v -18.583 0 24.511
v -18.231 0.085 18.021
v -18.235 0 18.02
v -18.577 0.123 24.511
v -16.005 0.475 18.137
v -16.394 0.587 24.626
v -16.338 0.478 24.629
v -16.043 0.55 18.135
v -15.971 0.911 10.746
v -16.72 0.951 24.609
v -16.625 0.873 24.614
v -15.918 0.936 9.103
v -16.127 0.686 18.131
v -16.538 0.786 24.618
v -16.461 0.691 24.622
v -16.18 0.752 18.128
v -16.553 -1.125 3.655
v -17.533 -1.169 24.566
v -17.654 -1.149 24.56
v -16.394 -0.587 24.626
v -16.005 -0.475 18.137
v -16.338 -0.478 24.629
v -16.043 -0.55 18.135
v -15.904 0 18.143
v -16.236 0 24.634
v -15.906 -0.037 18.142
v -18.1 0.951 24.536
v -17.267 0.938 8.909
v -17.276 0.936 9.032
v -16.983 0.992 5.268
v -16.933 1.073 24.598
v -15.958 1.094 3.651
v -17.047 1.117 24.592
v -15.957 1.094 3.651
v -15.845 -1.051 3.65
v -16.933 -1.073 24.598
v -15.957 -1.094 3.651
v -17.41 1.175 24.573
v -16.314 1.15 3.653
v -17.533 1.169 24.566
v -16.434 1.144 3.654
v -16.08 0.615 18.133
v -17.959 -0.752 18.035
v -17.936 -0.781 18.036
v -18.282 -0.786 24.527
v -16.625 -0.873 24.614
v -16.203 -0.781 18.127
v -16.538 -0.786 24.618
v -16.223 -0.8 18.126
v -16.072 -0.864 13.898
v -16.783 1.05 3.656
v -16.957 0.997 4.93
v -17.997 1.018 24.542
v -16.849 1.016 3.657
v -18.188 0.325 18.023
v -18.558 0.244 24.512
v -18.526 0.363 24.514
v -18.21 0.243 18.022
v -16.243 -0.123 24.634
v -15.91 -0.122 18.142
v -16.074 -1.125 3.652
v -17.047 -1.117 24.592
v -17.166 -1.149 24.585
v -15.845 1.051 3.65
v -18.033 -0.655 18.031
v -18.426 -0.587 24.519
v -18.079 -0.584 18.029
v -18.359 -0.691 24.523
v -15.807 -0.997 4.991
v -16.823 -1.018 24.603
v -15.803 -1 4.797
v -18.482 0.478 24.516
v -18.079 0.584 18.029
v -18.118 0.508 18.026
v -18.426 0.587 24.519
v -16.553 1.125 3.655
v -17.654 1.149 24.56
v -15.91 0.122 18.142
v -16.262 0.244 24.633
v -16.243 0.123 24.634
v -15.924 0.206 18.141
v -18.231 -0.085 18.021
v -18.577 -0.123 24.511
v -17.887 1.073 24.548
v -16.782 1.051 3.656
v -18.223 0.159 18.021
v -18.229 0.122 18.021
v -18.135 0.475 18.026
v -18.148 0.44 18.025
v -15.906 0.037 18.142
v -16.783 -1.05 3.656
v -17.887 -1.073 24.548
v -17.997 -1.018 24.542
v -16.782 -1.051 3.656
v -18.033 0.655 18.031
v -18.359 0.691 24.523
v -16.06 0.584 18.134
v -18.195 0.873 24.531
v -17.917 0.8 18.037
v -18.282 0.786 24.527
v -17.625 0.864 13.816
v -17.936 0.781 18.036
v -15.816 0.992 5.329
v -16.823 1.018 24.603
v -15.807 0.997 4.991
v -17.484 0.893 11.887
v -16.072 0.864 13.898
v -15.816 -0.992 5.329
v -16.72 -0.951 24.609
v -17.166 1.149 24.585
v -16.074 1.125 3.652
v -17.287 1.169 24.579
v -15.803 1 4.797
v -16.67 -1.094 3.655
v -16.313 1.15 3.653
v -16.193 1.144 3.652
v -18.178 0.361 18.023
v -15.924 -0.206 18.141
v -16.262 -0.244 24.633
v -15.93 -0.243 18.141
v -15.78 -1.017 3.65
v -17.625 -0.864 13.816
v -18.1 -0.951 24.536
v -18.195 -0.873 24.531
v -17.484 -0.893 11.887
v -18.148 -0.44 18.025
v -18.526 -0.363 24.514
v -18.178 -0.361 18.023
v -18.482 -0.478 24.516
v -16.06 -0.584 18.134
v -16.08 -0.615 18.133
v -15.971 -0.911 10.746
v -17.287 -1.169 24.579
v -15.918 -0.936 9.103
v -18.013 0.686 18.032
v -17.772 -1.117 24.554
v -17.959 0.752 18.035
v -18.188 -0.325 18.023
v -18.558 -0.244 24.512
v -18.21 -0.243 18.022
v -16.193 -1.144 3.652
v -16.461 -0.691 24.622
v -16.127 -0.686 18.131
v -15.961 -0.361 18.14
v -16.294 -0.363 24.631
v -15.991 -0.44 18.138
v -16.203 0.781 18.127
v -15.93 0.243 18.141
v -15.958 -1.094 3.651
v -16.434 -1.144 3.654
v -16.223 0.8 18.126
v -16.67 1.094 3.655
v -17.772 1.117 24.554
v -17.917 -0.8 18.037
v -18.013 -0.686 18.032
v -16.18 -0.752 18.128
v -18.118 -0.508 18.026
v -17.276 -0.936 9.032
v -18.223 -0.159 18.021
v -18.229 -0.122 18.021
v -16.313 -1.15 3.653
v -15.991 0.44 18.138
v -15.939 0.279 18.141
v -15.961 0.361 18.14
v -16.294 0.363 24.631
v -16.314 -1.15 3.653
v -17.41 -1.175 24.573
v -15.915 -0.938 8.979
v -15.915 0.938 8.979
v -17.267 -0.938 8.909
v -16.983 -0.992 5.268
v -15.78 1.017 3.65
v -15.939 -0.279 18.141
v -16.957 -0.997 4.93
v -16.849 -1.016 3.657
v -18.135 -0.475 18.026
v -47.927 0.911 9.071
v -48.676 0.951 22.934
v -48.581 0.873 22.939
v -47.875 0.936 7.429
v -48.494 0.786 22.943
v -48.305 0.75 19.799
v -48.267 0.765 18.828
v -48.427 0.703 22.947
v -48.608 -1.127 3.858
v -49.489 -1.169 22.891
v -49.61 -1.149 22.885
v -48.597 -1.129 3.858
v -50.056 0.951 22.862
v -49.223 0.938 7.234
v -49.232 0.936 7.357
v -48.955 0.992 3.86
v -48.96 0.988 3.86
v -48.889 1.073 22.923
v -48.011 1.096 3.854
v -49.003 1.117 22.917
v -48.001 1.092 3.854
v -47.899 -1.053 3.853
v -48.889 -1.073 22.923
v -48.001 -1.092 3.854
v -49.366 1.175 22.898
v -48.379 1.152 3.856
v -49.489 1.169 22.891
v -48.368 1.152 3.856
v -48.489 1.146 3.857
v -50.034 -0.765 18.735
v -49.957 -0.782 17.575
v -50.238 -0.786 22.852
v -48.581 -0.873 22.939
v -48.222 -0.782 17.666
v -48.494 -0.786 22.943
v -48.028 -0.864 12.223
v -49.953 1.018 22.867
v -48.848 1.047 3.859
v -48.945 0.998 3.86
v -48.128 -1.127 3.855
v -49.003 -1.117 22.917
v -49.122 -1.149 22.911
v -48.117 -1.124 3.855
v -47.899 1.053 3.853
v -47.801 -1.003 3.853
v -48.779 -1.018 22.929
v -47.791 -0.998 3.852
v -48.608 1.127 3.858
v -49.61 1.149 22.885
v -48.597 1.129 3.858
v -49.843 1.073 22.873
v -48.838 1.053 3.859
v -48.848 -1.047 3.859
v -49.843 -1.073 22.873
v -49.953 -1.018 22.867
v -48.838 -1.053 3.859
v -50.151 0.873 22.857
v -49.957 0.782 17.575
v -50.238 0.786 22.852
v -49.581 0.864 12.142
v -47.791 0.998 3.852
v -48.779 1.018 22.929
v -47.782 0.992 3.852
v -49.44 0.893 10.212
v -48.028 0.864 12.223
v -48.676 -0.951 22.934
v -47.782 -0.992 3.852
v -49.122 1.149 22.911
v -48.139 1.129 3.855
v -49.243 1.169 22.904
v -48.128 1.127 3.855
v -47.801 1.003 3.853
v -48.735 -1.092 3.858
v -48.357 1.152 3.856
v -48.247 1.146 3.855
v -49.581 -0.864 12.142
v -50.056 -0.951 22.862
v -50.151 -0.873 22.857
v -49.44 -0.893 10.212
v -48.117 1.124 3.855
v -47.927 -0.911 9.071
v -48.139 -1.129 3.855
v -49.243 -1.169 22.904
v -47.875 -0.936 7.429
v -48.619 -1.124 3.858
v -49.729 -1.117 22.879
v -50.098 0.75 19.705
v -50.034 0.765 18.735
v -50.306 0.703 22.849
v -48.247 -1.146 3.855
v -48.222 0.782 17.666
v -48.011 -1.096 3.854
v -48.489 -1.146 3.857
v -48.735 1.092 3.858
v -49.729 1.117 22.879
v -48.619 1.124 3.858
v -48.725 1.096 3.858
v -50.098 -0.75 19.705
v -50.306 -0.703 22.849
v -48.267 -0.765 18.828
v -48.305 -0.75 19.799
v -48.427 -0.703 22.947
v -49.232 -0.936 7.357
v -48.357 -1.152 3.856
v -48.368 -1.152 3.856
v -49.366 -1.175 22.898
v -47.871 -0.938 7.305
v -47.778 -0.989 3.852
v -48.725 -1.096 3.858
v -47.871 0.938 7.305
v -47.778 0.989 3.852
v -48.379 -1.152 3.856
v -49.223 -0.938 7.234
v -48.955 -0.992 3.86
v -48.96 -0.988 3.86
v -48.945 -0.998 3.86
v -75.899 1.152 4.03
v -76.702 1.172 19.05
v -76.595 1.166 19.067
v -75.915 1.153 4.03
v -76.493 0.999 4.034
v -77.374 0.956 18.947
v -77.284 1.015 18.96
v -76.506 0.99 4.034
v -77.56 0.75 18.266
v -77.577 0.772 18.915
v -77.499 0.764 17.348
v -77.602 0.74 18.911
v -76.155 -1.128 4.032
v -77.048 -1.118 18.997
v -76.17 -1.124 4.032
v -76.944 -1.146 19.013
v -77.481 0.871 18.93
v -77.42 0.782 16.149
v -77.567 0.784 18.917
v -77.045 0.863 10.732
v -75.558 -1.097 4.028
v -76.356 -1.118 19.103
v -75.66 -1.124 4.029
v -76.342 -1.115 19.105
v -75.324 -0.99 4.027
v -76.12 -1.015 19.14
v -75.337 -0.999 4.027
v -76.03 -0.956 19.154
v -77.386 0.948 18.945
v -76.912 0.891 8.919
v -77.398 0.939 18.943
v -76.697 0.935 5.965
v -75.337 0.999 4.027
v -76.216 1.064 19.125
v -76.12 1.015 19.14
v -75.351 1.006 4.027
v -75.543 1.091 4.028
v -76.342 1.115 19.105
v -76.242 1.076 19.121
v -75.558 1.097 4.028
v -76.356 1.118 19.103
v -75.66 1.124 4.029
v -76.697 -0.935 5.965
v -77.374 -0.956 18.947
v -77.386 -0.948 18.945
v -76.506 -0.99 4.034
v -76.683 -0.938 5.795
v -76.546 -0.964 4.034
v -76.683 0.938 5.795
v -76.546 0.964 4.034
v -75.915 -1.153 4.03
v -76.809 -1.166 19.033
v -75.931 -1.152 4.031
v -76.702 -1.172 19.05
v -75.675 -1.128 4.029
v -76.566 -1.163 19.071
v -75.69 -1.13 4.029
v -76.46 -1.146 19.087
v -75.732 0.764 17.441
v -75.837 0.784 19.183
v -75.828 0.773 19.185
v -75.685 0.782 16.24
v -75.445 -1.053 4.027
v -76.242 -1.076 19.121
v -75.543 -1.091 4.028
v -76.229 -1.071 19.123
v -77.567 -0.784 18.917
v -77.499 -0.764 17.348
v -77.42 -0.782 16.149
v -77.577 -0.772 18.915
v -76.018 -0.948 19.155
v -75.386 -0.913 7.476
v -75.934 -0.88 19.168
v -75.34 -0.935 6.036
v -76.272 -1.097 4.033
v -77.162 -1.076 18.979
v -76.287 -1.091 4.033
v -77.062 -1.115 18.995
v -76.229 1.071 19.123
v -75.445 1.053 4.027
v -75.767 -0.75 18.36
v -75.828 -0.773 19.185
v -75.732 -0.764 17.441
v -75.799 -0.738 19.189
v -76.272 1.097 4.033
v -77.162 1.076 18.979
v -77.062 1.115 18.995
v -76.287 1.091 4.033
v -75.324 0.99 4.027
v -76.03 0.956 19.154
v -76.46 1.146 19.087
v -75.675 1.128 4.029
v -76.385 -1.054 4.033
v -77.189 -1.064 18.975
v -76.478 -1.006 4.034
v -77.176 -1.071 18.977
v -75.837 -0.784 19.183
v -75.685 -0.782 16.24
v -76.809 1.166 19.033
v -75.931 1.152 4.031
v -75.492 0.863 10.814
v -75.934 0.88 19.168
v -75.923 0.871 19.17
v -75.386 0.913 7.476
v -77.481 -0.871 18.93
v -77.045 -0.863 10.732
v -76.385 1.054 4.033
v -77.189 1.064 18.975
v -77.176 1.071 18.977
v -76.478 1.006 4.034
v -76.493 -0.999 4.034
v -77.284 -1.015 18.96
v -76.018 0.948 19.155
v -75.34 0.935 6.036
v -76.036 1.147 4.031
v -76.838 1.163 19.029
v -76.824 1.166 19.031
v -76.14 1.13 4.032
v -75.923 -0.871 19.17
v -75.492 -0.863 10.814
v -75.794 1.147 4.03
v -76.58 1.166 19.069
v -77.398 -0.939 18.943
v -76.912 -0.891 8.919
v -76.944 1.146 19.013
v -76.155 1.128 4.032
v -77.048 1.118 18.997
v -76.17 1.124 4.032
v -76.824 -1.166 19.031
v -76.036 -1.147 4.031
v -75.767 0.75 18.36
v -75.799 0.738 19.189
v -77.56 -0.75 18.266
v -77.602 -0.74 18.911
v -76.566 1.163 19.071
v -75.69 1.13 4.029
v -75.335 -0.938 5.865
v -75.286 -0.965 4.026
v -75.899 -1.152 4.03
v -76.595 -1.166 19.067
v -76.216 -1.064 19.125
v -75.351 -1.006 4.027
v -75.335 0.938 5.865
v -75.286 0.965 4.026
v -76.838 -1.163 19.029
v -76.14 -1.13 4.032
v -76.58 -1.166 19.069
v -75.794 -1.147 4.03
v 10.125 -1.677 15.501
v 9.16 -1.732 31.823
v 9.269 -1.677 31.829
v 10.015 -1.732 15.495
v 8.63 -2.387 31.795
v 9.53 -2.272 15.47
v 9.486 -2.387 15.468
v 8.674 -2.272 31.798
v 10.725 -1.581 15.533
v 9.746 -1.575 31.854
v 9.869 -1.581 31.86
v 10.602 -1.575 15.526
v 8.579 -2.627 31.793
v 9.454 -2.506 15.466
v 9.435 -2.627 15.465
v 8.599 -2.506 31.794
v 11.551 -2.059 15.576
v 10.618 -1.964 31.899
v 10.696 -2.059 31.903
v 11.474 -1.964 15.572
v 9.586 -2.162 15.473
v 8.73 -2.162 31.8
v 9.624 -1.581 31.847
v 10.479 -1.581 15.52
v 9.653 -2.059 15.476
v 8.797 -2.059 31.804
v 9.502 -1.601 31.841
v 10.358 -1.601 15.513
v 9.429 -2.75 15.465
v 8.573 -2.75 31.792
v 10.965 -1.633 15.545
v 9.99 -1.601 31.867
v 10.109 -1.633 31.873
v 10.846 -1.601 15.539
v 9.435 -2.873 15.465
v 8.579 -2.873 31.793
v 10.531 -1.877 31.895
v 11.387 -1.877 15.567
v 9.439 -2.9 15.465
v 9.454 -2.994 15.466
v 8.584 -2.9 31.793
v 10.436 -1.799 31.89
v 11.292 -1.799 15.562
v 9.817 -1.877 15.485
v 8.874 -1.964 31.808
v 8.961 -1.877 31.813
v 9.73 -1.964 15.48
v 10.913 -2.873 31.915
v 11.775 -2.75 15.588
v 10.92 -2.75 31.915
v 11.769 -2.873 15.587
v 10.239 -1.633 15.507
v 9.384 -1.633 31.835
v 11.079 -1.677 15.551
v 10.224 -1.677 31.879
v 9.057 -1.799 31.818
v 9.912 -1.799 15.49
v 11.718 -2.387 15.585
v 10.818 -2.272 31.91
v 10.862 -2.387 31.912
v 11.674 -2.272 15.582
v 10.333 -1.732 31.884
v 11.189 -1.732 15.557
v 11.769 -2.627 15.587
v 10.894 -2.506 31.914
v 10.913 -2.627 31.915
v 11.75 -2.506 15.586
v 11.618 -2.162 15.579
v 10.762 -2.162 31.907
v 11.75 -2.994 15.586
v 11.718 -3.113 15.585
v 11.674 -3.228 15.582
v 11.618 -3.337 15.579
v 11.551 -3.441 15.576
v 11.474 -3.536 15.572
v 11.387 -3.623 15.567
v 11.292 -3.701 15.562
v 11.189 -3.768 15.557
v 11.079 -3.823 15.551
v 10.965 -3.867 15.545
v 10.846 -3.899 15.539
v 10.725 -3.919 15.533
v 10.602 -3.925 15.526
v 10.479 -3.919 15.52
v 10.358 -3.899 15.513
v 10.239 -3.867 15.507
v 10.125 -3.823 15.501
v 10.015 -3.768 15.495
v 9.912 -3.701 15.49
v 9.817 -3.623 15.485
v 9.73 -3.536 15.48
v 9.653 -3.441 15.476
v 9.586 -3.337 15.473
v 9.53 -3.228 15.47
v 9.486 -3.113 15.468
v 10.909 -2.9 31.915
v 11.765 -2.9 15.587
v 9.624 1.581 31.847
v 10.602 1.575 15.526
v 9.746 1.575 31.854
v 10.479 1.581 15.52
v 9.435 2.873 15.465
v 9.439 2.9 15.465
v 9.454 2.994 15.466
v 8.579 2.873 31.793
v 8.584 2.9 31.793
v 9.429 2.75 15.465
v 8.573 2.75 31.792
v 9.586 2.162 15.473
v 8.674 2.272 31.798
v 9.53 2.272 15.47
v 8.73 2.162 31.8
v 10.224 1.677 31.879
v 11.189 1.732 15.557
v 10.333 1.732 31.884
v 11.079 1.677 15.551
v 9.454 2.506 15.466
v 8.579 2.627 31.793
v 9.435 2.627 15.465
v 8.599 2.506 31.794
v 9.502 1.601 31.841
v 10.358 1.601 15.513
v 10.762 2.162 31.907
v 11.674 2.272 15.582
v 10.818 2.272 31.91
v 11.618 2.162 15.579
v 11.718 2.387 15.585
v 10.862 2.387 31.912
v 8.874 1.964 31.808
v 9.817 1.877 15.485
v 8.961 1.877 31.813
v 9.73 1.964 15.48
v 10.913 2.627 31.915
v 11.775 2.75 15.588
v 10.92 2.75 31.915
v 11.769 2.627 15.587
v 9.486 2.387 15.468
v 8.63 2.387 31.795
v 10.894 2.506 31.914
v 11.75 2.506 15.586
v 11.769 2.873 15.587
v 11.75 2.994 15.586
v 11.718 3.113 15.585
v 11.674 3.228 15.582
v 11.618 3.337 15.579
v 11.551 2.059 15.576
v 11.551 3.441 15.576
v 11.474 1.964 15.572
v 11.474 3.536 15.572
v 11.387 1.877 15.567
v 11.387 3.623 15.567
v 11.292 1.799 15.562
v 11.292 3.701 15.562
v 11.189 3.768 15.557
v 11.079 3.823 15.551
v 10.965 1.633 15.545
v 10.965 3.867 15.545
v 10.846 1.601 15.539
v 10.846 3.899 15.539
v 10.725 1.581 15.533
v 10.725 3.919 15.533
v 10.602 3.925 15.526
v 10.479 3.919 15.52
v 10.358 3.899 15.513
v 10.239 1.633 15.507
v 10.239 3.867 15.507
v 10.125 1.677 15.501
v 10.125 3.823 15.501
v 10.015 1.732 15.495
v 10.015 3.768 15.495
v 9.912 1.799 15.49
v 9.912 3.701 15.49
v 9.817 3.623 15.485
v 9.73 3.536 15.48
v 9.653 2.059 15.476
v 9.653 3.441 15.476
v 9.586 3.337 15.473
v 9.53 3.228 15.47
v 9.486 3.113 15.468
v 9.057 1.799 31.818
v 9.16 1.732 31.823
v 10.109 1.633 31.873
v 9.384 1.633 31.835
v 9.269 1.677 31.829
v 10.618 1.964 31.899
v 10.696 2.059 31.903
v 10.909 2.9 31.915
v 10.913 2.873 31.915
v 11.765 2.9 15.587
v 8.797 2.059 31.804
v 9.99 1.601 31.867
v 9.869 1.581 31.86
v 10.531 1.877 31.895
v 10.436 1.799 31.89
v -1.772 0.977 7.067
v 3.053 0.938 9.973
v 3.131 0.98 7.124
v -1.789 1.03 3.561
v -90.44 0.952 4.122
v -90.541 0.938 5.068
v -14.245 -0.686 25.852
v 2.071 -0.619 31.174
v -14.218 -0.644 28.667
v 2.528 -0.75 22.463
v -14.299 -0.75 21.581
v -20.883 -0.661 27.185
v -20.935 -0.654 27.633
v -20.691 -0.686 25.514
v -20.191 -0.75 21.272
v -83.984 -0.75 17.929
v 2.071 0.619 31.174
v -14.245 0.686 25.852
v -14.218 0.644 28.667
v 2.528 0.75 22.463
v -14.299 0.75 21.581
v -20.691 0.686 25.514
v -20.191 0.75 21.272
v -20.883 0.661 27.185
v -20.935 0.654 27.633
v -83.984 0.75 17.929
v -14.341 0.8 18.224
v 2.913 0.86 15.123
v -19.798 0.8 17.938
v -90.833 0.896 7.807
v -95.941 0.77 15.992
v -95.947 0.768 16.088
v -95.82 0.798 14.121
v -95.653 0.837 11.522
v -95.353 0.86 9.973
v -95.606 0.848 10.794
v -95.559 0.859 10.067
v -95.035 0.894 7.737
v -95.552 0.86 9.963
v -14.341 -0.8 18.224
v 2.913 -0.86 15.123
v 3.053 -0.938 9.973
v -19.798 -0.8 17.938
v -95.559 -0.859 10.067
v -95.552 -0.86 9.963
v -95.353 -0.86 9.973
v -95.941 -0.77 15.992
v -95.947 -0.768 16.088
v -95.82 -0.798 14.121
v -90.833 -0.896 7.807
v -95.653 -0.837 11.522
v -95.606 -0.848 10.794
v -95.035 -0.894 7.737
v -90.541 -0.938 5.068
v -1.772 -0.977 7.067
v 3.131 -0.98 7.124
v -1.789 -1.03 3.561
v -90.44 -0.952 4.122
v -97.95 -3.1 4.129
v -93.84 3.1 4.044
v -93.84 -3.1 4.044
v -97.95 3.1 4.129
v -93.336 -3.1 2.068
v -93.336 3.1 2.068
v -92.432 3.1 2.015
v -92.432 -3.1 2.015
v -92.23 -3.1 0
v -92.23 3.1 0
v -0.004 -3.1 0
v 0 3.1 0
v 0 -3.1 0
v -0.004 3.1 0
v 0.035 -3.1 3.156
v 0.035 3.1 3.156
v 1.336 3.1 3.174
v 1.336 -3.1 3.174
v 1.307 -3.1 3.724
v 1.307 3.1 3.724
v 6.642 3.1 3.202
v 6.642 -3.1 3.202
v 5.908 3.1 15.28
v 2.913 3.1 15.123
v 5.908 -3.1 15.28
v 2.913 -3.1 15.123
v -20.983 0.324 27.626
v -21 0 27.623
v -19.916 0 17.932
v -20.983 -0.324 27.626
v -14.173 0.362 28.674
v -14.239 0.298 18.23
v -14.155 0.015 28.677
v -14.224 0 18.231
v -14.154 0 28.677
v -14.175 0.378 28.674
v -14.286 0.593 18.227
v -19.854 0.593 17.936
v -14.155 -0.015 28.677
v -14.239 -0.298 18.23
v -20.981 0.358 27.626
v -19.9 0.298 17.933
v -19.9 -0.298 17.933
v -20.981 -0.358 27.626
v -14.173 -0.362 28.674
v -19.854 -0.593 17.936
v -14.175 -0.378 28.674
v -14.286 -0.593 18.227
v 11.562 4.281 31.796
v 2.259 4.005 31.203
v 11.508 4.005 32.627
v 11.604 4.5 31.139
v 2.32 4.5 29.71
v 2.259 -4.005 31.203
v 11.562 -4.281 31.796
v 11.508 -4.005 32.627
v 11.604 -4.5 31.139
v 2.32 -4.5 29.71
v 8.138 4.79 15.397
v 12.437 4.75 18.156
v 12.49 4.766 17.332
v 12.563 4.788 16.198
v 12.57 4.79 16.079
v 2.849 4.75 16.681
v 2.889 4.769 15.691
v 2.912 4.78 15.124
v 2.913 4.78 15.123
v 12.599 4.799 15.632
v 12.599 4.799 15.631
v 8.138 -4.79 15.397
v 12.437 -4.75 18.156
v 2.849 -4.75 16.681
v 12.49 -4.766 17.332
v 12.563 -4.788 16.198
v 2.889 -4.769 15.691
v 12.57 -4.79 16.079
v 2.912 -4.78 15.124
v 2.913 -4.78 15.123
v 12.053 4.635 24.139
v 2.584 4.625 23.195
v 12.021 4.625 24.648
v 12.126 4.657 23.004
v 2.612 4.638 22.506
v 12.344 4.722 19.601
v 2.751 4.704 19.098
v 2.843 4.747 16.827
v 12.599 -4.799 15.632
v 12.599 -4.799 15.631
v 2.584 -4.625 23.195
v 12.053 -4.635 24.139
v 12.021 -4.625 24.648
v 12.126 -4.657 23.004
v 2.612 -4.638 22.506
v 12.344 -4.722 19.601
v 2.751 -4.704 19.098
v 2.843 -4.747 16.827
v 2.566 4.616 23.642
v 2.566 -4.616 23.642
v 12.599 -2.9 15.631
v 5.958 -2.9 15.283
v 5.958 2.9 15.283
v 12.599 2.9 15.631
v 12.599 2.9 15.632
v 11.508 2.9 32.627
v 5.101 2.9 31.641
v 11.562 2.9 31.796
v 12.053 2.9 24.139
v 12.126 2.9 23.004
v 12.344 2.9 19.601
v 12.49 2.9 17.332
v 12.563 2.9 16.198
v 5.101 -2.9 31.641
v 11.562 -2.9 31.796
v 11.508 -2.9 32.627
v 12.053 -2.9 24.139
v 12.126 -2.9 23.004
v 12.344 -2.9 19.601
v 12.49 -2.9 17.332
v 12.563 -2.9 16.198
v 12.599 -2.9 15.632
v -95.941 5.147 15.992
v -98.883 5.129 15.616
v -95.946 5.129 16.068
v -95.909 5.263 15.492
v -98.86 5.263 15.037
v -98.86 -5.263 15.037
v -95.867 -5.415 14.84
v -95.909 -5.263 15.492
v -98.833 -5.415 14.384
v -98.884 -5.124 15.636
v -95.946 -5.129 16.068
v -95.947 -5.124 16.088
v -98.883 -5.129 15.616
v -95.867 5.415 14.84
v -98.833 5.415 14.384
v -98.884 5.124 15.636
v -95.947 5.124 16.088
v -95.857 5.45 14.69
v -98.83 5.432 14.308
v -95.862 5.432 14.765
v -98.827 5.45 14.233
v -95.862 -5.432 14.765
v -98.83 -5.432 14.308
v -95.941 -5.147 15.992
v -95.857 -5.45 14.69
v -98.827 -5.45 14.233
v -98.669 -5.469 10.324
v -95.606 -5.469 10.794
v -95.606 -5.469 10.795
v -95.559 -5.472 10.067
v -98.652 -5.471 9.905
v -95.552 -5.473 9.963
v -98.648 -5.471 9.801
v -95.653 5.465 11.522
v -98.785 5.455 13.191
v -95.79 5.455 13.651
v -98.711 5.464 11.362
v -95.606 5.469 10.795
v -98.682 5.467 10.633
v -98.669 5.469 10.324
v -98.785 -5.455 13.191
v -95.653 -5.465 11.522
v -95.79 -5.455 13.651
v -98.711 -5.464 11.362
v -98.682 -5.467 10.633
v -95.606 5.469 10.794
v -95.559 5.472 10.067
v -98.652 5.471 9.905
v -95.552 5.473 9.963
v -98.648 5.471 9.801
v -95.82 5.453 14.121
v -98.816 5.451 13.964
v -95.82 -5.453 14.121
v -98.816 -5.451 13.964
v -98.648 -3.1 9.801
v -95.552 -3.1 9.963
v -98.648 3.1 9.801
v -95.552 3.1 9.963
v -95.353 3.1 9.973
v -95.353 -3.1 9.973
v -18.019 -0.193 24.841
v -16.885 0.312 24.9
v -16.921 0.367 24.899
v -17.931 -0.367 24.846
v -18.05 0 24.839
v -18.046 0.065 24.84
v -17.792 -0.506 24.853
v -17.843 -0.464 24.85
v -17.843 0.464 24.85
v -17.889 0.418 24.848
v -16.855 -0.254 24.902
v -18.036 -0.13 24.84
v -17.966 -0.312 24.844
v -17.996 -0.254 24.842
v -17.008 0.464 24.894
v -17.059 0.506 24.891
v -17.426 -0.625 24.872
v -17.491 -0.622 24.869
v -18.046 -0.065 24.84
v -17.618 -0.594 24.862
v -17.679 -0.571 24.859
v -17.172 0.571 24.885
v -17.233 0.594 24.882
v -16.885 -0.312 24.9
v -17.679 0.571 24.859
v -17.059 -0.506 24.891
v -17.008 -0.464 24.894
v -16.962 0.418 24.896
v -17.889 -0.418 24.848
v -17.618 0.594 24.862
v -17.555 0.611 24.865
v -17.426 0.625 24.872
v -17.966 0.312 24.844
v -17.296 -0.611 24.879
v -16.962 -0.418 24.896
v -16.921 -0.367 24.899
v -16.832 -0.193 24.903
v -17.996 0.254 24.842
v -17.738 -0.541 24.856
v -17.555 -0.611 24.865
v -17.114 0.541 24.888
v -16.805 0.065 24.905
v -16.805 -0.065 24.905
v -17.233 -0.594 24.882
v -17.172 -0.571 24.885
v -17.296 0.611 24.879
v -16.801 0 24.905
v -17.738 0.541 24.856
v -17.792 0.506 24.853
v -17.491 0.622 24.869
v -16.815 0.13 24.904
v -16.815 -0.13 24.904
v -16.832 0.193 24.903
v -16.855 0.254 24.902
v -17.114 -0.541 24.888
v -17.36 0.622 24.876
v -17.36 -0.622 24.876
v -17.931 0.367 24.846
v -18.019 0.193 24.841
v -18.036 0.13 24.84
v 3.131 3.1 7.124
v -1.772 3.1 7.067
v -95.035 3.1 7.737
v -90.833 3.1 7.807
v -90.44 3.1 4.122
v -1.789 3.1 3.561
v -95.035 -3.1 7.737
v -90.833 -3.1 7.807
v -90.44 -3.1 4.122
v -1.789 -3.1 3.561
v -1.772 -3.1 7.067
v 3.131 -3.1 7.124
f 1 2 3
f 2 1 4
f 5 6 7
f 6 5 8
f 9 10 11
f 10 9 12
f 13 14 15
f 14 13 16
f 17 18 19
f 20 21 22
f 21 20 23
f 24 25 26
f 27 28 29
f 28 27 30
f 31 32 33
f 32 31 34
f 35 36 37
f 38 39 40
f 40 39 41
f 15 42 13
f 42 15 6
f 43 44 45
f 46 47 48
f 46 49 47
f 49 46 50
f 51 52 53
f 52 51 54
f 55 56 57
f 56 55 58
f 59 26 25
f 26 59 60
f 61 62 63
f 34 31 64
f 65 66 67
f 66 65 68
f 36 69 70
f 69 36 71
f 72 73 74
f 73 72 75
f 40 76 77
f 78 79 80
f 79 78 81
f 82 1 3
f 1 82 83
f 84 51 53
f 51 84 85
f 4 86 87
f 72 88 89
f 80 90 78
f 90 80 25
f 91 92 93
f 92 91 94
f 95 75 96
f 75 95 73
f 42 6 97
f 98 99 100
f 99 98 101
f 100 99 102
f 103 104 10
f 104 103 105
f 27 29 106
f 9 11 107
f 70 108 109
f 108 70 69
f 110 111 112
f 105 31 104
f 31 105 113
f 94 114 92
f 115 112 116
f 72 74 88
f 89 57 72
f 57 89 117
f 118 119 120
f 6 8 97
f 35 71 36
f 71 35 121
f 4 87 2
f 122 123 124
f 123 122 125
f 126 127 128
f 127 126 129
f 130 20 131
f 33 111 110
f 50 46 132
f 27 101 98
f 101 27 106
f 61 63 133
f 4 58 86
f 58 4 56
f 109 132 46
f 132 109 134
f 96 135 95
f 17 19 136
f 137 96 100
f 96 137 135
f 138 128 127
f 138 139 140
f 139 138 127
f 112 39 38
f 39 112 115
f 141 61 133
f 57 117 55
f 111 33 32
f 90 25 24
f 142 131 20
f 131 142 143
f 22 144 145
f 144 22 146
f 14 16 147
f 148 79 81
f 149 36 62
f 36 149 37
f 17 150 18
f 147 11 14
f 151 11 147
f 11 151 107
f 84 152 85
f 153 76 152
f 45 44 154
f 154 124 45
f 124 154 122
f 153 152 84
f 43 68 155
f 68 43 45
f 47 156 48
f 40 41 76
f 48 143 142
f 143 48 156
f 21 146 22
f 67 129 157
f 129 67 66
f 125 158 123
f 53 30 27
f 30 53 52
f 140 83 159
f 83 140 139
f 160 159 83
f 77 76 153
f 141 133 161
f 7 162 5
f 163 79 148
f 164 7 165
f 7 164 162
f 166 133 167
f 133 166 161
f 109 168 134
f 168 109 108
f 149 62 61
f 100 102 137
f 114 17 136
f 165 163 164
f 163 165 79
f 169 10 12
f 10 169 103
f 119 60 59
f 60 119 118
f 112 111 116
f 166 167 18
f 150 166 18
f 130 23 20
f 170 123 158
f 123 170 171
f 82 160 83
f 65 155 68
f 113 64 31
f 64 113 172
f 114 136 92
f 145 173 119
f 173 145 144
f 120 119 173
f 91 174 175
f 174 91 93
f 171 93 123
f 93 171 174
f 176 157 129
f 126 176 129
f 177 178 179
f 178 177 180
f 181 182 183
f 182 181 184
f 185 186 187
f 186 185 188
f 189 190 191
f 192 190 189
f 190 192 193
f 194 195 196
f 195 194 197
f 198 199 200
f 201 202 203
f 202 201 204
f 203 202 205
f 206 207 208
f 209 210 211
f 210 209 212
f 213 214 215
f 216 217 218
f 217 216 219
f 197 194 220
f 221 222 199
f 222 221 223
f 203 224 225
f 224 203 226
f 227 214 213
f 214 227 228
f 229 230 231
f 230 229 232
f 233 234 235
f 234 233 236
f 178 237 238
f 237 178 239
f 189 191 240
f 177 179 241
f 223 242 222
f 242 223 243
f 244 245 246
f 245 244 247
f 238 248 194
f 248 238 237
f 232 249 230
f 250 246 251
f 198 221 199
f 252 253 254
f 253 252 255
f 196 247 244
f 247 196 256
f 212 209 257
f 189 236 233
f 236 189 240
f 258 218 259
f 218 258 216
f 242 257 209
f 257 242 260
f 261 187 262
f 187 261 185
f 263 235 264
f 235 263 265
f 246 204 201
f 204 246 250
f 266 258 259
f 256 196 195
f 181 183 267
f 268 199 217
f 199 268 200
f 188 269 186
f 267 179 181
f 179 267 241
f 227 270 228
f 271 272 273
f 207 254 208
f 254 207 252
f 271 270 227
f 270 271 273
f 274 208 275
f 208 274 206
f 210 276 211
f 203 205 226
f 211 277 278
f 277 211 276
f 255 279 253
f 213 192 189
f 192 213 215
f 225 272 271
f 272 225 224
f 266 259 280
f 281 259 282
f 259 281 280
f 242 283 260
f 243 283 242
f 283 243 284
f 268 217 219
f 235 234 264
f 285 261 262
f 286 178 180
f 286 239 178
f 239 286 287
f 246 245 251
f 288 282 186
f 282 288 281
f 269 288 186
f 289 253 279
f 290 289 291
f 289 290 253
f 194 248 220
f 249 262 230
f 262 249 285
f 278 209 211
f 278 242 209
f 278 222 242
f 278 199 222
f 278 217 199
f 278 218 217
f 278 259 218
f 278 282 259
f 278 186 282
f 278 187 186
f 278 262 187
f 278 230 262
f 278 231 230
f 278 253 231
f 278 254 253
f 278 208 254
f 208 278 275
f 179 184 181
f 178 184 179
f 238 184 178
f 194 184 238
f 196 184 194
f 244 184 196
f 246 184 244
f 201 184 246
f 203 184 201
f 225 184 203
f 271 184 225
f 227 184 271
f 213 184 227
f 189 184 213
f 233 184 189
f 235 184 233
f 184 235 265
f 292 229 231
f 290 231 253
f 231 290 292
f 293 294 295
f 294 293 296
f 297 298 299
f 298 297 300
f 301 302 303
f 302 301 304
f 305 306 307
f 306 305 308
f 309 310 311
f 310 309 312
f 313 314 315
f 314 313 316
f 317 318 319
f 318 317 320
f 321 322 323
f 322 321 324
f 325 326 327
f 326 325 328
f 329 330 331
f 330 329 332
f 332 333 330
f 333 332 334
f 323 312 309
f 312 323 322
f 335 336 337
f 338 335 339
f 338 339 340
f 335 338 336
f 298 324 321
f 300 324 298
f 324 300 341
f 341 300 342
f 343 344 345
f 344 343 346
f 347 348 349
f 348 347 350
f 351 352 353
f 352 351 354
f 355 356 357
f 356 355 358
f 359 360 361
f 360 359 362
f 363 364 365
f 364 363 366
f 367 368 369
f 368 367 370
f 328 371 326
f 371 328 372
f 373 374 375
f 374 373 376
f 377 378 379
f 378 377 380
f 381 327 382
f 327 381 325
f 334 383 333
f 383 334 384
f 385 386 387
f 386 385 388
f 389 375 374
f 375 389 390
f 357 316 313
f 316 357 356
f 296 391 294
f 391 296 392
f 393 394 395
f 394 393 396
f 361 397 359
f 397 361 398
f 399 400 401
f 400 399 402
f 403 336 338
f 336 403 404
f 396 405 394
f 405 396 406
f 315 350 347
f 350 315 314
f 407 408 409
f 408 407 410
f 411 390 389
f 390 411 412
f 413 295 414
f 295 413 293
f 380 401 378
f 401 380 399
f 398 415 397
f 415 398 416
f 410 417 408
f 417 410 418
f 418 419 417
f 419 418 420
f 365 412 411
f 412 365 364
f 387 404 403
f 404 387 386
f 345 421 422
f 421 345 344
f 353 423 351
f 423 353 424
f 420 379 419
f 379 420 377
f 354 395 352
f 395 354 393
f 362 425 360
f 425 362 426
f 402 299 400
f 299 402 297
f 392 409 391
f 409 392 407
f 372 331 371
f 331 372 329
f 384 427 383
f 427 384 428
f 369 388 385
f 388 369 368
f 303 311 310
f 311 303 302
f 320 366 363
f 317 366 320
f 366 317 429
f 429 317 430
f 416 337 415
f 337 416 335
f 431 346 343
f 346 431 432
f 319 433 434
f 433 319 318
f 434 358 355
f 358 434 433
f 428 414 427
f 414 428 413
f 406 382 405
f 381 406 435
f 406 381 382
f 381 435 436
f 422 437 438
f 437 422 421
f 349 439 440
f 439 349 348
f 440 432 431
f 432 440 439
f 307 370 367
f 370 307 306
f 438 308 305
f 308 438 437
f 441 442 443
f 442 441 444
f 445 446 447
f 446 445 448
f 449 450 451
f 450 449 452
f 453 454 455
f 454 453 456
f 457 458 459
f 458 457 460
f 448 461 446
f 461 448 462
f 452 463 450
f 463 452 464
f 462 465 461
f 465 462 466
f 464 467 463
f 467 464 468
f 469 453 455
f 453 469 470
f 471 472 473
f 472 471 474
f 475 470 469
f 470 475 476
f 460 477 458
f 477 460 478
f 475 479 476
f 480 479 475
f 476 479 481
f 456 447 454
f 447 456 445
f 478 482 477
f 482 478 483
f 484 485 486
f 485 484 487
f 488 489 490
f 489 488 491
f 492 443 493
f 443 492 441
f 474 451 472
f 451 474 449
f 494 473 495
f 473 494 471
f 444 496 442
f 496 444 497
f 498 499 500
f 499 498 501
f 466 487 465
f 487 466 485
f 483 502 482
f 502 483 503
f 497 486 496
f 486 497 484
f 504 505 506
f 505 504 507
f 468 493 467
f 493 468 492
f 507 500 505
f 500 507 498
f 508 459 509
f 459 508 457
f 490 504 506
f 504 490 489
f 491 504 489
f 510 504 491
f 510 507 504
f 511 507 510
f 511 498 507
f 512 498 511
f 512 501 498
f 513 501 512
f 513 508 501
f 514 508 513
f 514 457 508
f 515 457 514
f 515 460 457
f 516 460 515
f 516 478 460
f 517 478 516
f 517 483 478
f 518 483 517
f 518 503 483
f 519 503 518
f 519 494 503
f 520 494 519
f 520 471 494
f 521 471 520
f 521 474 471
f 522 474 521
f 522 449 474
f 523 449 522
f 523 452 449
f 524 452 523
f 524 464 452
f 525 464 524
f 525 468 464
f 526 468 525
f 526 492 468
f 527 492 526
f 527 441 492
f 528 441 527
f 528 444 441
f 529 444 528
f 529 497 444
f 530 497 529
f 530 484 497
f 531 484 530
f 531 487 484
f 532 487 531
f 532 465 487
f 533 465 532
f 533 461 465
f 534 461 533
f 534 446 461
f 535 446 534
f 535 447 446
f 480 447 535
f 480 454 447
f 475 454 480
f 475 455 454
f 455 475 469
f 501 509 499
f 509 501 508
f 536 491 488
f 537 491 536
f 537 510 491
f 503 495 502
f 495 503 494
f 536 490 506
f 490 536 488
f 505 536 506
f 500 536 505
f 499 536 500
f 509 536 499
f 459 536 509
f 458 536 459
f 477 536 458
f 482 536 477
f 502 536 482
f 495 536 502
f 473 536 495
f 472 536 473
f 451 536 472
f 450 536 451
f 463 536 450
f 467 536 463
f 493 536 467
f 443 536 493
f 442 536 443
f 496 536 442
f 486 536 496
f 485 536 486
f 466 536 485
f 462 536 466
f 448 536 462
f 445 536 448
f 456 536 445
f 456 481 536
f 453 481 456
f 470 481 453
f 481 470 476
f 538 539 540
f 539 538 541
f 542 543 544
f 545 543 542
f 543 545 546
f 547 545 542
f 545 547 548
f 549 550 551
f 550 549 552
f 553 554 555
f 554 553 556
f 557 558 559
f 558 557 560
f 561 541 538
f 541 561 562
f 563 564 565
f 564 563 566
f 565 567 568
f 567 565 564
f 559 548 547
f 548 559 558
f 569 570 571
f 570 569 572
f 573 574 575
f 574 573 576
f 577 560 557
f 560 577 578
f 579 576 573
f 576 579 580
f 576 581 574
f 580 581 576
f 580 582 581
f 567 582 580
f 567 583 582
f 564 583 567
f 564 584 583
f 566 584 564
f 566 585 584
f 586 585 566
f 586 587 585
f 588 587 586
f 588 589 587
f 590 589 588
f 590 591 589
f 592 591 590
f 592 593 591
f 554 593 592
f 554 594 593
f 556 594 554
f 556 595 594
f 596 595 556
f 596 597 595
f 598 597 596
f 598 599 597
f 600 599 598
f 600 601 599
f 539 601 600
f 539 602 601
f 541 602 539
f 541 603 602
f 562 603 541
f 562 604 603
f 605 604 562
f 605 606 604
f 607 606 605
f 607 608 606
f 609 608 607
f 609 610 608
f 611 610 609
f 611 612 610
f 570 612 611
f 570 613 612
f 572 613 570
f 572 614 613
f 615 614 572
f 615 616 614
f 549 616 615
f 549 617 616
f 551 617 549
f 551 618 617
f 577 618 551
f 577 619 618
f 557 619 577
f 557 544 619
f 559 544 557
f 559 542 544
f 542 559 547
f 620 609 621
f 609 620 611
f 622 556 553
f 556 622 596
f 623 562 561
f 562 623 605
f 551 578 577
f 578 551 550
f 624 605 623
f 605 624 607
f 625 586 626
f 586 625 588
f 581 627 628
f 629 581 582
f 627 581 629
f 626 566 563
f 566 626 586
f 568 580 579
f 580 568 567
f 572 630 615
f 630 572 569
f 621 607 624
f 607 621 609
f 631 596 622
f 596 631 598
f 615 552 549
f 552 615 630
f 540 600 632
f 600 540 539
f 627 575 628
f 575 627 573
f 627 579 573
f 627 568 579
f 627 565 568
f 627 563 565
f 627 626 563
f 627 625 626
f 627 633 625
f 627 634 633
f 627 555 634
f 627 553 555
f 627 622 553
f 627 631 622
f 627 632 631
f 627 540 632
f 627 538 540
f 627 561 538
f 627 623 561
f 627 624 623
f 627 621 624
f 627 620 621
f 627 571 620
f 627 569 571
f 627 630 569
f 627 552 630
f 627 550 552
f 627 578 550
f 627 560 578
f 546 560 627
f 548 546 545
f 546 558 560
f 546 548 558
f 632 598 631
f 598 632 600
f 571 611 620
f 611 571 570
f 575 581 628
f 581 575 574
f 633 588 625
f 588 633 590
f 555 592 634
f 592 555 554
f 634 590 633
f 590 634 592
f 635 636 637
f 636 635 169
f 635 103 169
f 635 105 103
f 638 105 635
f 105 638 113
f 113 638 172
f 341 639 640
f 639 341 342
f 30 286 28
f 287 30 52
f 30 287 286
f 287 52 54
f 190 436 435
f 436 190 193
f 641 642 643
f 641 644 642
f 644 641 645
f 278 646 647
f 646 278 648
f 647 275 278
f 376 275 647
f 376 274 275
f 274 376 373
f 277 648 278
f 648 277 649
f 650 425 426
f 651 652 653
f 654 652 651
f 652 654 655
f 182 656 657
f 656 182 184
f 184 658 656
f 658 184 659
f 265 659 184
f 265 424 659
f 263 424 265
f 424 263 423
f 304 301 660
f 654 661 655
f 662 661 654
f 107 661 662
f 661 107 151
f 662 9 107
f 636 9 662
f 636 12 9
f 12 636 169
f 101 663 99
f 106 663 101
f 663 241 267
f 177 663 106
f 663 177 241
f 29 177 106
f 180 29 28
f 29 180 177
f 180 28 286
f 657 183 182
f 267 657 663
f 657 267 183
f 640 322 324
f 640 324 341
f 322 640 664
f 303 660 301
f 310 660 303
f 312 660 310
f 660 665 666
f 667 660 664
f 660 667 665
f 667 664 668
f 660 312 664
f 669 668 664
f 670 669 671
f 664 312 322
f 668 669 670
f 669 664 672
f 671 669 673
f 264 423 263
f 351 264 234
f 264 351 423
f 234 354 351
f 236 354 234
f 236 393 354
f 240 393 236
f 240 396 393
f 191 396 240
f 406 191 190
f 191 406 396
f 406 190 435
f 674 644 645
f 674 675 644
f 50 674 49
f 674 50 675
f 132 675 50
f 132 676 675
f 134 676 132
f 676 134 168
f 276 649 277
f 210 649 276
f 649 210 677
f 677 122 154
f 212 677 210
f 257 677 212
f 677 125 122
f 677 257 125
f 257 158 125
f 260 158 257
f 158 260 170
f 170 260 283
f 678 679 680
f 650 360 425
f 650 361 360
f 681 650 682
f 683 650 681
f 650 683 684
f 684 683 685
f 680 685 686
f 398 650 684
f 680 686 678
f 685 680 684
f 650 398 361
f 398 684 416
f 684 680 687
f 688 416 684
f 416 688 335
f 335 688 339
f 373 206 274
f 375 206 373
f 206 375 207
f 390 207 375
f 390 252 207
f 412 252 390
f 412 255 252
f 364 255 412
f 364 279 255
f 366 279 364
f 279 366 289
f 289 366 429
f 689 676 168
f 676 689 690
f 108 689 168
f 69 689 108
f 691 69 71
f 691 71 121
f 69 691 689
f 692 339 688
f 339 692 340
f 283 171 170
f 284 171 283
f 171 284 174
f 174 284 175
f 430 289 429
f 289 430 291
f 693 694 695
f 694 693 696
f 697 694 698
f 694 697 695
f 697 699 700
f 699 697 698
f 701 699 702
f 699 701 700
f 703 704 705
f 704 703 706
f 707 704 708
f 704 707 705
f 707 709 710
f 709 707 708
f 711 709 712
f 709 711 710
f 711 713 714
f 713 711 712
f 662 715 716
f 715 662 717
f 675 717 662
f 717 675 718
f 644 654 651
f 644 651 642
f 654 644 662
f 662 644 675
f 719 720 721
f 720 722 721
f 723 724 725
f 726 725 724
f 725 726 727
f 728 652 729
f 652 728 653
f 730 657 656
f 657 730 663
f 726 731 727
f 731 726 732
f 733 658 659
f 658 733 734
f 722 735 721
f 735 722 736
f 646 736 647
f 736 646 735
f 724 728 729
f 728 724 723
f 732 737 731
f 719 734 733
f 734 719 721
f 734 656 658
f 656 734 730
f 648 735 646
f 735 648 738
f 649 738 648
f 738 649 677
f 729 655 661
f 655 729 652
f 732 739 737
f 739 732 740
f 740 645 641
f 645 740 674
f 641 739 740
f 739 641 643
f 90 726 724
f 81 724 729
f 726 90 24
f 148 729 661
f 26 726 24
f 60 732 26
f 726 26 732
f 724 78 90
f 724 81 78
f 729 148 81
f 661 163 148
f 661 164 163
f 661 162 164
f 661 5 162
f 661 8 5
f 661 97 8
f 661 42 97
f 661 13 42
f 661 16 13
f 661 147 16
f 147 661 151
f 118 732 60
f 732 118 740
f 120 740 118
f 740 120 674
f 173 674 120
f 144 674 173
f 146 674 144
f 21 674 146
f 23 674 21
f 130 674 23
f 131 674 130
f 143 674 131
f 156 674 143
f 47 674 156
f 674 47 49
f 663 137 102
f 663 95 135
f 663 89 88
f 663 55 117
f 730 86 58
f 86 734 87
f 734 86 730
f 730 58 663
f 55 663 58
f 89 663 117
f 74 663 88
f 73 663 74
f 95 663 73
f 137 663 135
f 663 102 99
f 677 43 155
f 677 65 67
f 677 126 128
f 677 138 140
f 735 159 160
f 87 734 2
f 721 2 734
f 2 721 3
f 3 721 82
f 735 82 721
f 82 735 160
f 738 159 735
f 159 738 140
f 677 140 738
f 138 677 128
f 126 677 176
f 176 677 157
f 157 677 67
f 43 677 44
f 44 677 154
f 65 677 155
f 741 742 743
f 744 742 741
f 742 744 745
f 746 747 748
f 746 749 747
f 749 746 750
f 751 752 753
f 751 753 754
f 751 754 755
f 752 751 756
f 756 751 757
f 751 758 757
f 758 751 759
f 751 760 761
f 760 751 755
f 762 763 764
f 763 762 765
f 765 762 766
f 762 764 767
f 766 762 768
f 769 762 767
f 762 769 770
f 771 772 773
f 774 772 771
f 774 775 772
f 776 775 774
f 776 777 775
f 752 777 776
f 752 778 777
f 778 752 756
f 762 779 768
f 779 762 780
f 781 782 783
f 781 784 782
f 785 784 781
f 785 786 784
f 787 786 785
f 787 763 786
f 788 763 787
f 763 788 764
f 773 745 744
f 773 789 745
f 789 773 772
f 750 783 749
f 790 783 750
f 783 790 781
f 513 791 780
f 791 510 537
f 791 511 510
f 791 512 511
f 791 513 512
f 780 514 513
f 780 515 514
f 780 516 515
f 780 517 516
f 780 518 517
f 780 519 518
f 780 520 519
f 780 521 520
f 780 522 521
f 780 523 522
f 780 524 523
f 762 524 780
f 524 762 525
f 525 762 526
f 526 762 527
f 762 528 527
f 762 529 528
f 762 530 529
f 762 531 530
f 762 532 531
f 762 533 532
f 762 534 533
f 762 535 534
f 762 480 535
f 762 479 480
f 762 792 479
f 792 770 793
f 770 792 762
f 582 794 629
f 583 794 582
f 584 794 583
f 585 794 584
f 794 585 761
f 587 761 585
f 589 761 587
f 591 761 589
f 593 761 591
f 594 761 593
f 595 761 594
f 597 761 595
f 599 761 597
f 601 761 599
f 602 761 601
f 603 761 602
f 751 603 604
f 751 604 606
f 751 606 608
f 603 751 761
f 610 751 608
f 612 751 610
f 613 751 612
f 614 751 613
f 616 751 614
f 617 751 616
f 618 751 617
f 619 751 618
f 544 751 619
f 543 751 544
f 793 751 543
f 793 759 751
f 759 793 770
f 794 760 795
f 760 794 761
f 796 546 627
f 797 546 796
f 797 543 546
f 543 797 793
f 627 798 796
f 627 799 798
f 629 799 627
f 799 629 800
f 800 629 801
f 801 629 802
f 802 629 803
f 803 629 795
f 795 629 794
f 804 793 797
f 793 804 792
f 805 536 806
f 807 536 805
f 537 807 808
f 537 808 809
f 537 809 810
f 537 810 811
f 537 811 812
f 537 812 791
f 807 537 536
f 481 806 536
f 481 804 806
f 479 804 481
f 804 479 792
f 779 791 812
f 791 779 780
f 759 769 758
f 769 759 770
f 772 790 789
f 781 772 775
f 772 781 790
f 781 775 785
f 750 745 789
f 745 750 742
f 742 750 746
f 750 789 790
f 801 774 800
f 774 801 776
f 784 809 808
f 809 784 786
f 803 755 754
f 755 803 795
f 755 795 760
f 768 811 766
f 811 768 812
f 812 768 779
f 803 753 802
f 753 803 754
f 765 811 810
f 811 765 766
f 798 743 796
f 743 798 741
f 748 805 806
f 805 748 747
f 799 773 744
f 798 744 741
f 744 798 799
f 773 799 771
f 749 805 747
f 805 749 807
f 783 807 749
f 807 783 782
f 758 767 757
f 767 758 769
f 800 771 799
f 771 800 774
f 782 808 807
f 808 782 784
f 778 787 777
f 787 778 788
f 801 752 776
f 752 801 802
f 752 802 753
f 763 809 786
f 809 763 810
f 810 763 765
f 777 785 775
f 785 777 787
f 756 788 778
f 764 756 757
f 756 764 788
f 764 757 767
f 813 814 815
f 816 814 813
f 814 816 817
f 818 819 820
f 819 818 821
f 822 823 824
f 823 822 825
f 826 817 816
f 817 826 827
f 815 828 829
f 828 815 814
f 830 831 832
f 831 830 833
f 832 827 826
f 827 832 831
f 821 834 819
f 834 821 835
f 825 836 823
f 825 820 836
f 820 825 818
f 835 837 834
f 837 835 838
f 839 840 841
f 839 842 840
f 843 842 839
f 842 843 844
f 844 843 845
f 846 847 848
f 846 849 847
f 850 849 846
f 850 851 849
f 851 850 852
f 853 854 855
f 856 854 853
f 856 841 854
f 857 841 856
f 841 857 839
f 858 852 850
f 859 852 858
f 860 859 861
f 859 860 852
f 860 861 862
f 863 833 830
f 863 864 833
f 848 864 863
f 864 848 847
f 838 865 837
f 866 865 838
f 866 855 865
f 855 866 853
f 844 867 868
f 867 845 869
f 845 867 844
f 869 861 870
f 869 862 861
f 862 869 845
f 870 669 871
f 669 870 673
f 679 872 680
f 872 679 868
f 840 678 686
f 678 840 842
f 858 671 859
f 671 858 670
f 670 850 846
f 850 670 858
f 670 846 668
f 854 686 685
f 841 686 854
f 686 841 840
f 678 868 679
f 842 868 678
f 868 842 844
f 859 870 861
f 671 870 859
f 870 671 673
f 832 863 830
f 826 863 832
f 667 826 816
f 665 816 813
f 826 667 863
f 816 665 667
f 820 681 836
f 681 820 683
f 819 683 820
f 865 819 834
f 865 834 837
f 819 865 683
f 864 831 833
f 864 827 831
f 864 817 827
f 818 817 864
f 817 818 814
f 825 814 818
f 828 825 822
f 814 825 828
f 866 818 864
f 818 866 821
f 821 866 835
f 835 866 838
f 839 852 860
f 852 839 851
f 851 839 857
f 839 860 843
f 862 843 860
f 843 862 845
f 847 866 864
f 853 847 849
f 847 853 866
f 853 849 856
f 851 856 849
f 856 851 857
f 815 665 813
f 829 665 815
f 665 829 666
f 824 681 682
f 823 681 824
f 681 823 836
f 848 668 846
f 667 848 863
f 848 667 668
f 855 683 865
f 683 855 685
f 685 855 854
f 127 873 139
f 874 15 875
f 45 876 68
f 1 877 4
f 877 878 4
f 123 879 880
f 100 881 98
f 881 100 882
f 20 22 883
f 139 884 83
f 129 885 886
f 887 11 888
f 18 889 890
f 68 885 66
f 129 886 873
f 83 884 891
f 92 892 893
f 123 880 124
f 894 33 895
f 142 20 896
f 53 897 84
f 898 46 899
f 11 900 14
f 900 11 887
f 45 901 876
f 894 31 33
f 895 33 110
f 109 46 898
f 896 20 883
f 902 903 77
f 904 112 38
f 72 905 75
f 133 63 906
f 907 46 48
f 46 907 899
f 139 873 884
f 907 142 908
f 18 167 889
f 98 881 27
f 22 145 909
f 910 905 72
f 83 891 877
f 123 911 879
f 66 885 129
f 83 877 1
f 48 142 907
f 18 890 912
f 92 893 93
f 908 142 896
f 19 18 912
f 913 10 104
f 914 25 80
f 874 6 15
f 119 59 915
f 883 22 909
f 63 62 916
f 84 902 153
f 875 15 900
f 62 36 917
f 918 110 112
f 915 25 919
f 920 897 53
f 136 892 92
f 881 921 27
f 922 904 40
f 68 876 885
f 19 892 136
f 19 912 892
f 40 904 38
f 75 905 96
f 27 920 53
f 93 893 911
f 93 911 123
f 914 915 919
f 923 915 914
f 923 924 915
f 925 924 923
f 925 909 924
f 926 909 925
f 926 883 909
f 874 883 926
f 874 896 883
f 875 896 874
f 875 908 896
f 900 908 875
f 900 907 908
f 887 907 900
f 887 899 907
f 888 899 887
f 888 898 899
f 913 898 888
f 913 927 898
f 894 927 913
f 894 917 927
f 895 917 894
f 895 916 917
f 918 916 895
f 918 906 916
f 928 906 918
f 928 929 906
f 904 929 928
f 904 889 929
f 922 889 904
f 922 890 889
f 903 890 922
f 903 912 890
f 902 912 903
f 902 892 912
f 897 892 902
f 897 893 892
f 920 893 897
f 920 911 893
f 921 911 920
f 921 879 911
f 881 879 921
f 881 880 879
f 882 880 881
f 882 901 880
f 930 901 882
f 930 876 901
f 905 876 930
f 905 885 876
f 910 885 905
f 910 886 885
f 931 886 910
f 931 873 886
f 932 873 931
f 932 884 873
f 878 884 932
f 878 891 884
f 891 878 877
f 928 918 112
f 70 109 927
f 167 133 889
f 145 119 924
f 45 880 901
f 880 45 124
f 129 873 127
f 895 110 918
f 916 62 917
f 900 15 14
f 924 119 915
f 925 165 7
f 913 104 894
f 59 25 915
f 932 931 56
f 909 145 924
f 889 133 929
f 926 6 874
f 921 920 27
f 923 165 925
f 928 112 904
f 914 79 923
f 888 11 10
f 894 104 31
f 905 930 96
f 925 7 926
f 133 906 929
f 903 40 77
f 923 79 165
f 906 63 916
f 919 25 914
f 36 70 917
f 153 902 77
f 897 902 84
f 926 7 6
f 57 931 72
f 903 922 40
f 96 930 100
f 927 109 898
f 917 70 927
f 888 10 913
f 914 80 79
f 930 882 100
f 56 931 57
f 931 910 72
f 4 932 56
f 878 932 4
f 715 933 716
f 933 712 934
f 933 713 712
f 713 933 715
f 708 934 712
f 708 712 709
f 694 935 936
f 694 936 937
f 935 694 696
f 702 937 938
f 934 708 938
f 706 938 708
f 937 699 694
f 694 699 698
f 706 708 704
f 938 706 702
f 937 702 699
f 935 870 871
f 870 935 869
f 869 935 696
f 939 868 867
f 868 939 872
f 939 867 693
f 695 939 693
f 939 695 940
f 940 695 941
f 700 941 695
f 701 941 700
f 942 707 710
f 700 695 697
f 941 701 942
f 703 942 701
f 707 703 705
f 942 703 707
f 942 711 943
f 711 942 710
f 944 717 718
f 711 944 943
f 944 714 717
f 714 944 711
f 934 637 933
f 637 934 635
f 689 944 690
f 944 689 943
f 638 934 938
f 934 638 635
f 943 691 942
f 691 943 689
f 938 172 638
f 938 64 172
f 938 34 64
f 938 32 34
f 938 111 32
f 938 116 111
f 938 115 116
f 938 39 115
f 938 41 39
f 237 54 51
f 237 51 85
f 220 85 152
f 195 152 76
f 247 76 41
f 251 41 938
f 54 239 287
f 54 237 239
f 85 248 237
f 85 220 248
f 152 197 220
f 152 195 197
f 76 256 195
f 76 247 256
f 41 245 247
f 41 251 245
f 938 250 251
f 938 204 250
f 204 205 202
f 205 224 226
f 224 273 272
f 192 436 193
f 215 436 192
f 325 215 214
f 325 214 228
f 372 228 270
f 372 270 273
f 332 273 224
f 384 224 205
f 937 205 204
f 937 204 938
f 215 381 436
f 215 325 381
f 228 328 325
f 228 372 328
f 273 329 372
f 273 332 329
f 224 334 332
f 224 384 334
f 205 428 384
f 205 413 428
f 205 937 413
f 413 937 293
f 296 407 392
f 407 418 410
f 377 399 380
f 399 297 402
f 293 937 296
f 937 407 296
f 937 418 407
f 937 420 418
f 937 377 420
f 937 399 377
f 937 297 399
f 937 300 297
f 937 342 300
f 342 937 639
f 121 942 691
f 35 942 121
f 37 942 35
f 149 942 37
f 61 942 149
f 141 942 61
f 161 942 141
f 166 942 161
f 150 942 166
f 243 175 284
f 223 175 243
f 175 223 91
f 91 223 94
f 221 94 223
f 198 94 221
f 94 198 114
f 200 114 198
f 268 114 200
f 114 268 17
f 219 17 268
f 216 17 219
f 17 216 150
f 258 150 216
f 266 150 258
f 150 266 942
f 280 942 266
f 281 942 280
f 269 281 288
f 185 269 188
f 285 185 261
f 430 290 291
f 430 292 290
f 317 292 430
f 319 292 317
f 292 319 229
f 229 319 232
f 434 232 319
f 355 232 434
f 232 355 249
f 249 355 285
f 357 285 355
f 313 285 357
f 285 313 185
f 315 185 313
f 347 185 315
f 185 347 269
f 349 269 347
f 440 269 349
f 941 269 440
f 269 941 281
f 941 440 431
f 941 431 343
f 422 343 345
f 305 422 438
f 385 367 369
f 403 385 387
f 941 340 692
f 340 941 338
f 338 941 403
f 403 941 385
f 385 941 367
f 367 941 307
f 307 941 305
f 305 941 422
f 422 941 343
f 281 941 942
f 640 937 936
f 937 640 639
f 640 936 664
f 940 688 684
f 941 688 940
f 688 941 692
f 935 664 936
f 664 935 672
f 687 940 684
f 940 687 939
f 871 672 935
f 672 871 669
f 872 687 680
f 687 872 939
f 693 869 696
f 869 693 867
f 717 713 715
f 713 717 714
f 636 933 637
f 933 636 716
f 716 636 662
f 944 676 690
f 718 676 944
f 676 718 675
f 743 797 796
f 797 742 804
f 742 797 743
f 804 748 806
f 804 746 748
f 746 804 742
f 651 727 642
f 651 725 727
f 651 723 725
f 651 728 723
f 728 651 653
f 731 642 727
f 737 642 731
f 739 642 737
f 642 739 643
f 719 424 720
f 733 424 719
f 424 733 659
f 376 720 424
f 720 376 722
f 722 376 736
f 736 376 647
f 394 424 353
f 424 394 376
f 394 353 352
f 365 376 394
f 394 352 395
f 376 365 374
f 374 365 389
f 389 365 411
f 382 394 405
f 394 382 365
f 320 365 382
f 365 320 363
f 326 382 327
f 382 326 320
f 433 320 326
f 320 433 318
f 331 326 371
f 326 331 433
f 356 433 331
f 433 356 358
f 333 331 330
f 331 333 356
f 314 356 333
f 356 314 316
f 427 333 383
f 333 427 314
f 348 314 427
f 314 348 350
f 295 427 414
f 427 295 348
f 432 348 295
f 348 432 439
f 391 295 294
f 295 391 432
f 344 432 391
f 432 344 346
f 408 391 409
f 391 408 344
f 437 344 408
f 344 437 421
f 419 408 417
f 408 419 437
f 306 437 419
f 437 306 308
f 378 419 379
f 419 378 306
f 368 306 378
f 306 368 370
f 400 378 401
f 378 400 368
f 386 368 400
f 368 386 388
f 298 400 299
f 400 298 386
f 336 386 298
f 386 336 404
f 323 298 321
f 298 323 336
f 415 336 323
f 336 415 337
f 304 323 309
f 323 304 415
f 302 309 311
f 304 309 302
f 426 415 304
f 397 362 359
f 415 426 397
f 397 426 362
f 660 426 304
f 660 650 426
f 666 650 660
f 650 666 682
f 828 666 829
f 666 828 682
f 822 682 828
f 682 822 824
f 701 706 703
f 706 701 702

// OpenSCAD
// Keyboard divider for Macintosh Portable
// Copyright François Revol, 2026


top_height = 14.95;
bottom_height=17.05;

bbox = [111.4, 11.05, top_height+bottom_height];

top_angle = 3;
bottom_angle = 5.75;


$fn=60;


module divider() {

    module shape1() {
        polygon([
            [6.7,0],
            [6.6,12.1],
            [11.9,11.3],
            [11.9,11.85],
            [13.2,11.8],
            [13.4,14.95],
            [105.5,10.2],// actually a bit lower but we'll shave that
            [105.6,8.1],
            [106.5,8],
            [106.9,6],
            [111,5.7],
            [111.4,0],
            [108.1,0],
            [107.9,2.25],
            [103.7,2.4],
            [103.5,6.1],
            [15,11.3],
            [14.8,7.8],
            [9.9,8],
            [9.7,0],
        ]);
    }

    module shape2() {
        polygon([
            [6.7,0],
            [6.6,12.1],
            [11.9,11.3],
            [11.9,11.85],
            [13.2,11.8],
            [13.4,14.95],
            [105.5,10.2],
            [105.6,8.1],
            [106.5,8],
            [106.9,6],
            [111,5.7],
            [111.4,0],
            [111.4,-20],
            [9.7,-20],
            [9.7,0],
        ]);
    }

    difference() {
        union() {
            for (dx=[29.5, 61.5, 89])
                translate([dx-bbox.x/2,0,-10.5]) cylinder(d1=2.35, d2=2.30, h=(dx<80?21:20));
            translate([29.5-bbox.x/2,0,-10.5-0.3]) cylinder(d1=1.25, d2=2.35, h=0.3);


            for (dy=[-1,1])
                translate([2-bbox.x/2,dy*5.5/2,-16.35]) cylinder(d=2.35, h=16.35);

            difference() {
                intersection() {
                    translate([9-bbox.x/2+100/2,0,-17.35]) linear_extrude(30, scale=[1,2.1/1.2]) square([100,1.2], center=true);
                    translate([-bbox.x/2,6.2/2,0]) rotate([90,0,0]) linear_extrude(6.2) shape2();
                }
                translate([29.5-bbox.x/2,0,-15]) cylinder(d1=7, d2=5.7, h=11);
            }

            translate([9.7/2-bbox.x/2,0,-bottom_height]) intersection() {
                linear_extrude(bottom_height) difference() {
                    square([9.7,9.6], center=true);
                    translate([-2.9,0]) square([9.4,5.8], center=true);
                }
                linear_extrude(bottom_height, scale=[9.7/9.3,1]) square([9.3,10], center=true);
                translate([-9.4/2,0,0]) rotate([0,-bottom_angle,0]) translate([9.4/2,0,0]) union() {
                    linear_extrude(1.5, scale=[1,9/8]) square([20,8], center=true);
                    translate([0,0,1.5]) linear_extrude(bottom_height-1.5, scale=[1,9.6/9]) square([20,9], center=true);
                }
            }

            translate([bbox.x/2-3.1/2,0,-6.25]) intersection() {
                linear_extrude(6.25, scale=[3.10/2.95,1]) square([2.95,bbox.y], center=true);
                translate([-3.1/2,0,0]) rotate([0,-bottom_angle,0]) translate([3.1/2,0,0]) union() {
                    linear_extrude(1.5, scale=[1,10.9/10.2]) square([10,10.2], center=true);
                    translate([0,0,1.5]) linear_extrude(bottom_height-1.5, scale=[1,11.05/10.9]) square([10,10.9], center=true);
                }
            }

            translate([-bbox.x/2,6.2/2,0]) rotate([90,0,0]) linear_extrude(6.2) shape1();
        }
        translate([-bbox.x/2,0,-bottom_height]) rotate([0,-bottom_angle,0]) translate([0,-20/2,-20]) cube([120,20,20]);
        translate([13.4-bbox.x/2,0,top_height]) rotate([0,top_angle,0]) translate([-13.4,-20/2,0]) cube([120,20,20]);
    }

}


if ($preview) {
    divider();
    //color("green", 0.2) translate([0,0,bbox.z/2-bottom_height]) cube(bbox, center=true);
} else {
    rotate([0,180-top_angle,0]) 
        translate([bbox.x/2-13.4,0,-14.95])
            divider();
}
